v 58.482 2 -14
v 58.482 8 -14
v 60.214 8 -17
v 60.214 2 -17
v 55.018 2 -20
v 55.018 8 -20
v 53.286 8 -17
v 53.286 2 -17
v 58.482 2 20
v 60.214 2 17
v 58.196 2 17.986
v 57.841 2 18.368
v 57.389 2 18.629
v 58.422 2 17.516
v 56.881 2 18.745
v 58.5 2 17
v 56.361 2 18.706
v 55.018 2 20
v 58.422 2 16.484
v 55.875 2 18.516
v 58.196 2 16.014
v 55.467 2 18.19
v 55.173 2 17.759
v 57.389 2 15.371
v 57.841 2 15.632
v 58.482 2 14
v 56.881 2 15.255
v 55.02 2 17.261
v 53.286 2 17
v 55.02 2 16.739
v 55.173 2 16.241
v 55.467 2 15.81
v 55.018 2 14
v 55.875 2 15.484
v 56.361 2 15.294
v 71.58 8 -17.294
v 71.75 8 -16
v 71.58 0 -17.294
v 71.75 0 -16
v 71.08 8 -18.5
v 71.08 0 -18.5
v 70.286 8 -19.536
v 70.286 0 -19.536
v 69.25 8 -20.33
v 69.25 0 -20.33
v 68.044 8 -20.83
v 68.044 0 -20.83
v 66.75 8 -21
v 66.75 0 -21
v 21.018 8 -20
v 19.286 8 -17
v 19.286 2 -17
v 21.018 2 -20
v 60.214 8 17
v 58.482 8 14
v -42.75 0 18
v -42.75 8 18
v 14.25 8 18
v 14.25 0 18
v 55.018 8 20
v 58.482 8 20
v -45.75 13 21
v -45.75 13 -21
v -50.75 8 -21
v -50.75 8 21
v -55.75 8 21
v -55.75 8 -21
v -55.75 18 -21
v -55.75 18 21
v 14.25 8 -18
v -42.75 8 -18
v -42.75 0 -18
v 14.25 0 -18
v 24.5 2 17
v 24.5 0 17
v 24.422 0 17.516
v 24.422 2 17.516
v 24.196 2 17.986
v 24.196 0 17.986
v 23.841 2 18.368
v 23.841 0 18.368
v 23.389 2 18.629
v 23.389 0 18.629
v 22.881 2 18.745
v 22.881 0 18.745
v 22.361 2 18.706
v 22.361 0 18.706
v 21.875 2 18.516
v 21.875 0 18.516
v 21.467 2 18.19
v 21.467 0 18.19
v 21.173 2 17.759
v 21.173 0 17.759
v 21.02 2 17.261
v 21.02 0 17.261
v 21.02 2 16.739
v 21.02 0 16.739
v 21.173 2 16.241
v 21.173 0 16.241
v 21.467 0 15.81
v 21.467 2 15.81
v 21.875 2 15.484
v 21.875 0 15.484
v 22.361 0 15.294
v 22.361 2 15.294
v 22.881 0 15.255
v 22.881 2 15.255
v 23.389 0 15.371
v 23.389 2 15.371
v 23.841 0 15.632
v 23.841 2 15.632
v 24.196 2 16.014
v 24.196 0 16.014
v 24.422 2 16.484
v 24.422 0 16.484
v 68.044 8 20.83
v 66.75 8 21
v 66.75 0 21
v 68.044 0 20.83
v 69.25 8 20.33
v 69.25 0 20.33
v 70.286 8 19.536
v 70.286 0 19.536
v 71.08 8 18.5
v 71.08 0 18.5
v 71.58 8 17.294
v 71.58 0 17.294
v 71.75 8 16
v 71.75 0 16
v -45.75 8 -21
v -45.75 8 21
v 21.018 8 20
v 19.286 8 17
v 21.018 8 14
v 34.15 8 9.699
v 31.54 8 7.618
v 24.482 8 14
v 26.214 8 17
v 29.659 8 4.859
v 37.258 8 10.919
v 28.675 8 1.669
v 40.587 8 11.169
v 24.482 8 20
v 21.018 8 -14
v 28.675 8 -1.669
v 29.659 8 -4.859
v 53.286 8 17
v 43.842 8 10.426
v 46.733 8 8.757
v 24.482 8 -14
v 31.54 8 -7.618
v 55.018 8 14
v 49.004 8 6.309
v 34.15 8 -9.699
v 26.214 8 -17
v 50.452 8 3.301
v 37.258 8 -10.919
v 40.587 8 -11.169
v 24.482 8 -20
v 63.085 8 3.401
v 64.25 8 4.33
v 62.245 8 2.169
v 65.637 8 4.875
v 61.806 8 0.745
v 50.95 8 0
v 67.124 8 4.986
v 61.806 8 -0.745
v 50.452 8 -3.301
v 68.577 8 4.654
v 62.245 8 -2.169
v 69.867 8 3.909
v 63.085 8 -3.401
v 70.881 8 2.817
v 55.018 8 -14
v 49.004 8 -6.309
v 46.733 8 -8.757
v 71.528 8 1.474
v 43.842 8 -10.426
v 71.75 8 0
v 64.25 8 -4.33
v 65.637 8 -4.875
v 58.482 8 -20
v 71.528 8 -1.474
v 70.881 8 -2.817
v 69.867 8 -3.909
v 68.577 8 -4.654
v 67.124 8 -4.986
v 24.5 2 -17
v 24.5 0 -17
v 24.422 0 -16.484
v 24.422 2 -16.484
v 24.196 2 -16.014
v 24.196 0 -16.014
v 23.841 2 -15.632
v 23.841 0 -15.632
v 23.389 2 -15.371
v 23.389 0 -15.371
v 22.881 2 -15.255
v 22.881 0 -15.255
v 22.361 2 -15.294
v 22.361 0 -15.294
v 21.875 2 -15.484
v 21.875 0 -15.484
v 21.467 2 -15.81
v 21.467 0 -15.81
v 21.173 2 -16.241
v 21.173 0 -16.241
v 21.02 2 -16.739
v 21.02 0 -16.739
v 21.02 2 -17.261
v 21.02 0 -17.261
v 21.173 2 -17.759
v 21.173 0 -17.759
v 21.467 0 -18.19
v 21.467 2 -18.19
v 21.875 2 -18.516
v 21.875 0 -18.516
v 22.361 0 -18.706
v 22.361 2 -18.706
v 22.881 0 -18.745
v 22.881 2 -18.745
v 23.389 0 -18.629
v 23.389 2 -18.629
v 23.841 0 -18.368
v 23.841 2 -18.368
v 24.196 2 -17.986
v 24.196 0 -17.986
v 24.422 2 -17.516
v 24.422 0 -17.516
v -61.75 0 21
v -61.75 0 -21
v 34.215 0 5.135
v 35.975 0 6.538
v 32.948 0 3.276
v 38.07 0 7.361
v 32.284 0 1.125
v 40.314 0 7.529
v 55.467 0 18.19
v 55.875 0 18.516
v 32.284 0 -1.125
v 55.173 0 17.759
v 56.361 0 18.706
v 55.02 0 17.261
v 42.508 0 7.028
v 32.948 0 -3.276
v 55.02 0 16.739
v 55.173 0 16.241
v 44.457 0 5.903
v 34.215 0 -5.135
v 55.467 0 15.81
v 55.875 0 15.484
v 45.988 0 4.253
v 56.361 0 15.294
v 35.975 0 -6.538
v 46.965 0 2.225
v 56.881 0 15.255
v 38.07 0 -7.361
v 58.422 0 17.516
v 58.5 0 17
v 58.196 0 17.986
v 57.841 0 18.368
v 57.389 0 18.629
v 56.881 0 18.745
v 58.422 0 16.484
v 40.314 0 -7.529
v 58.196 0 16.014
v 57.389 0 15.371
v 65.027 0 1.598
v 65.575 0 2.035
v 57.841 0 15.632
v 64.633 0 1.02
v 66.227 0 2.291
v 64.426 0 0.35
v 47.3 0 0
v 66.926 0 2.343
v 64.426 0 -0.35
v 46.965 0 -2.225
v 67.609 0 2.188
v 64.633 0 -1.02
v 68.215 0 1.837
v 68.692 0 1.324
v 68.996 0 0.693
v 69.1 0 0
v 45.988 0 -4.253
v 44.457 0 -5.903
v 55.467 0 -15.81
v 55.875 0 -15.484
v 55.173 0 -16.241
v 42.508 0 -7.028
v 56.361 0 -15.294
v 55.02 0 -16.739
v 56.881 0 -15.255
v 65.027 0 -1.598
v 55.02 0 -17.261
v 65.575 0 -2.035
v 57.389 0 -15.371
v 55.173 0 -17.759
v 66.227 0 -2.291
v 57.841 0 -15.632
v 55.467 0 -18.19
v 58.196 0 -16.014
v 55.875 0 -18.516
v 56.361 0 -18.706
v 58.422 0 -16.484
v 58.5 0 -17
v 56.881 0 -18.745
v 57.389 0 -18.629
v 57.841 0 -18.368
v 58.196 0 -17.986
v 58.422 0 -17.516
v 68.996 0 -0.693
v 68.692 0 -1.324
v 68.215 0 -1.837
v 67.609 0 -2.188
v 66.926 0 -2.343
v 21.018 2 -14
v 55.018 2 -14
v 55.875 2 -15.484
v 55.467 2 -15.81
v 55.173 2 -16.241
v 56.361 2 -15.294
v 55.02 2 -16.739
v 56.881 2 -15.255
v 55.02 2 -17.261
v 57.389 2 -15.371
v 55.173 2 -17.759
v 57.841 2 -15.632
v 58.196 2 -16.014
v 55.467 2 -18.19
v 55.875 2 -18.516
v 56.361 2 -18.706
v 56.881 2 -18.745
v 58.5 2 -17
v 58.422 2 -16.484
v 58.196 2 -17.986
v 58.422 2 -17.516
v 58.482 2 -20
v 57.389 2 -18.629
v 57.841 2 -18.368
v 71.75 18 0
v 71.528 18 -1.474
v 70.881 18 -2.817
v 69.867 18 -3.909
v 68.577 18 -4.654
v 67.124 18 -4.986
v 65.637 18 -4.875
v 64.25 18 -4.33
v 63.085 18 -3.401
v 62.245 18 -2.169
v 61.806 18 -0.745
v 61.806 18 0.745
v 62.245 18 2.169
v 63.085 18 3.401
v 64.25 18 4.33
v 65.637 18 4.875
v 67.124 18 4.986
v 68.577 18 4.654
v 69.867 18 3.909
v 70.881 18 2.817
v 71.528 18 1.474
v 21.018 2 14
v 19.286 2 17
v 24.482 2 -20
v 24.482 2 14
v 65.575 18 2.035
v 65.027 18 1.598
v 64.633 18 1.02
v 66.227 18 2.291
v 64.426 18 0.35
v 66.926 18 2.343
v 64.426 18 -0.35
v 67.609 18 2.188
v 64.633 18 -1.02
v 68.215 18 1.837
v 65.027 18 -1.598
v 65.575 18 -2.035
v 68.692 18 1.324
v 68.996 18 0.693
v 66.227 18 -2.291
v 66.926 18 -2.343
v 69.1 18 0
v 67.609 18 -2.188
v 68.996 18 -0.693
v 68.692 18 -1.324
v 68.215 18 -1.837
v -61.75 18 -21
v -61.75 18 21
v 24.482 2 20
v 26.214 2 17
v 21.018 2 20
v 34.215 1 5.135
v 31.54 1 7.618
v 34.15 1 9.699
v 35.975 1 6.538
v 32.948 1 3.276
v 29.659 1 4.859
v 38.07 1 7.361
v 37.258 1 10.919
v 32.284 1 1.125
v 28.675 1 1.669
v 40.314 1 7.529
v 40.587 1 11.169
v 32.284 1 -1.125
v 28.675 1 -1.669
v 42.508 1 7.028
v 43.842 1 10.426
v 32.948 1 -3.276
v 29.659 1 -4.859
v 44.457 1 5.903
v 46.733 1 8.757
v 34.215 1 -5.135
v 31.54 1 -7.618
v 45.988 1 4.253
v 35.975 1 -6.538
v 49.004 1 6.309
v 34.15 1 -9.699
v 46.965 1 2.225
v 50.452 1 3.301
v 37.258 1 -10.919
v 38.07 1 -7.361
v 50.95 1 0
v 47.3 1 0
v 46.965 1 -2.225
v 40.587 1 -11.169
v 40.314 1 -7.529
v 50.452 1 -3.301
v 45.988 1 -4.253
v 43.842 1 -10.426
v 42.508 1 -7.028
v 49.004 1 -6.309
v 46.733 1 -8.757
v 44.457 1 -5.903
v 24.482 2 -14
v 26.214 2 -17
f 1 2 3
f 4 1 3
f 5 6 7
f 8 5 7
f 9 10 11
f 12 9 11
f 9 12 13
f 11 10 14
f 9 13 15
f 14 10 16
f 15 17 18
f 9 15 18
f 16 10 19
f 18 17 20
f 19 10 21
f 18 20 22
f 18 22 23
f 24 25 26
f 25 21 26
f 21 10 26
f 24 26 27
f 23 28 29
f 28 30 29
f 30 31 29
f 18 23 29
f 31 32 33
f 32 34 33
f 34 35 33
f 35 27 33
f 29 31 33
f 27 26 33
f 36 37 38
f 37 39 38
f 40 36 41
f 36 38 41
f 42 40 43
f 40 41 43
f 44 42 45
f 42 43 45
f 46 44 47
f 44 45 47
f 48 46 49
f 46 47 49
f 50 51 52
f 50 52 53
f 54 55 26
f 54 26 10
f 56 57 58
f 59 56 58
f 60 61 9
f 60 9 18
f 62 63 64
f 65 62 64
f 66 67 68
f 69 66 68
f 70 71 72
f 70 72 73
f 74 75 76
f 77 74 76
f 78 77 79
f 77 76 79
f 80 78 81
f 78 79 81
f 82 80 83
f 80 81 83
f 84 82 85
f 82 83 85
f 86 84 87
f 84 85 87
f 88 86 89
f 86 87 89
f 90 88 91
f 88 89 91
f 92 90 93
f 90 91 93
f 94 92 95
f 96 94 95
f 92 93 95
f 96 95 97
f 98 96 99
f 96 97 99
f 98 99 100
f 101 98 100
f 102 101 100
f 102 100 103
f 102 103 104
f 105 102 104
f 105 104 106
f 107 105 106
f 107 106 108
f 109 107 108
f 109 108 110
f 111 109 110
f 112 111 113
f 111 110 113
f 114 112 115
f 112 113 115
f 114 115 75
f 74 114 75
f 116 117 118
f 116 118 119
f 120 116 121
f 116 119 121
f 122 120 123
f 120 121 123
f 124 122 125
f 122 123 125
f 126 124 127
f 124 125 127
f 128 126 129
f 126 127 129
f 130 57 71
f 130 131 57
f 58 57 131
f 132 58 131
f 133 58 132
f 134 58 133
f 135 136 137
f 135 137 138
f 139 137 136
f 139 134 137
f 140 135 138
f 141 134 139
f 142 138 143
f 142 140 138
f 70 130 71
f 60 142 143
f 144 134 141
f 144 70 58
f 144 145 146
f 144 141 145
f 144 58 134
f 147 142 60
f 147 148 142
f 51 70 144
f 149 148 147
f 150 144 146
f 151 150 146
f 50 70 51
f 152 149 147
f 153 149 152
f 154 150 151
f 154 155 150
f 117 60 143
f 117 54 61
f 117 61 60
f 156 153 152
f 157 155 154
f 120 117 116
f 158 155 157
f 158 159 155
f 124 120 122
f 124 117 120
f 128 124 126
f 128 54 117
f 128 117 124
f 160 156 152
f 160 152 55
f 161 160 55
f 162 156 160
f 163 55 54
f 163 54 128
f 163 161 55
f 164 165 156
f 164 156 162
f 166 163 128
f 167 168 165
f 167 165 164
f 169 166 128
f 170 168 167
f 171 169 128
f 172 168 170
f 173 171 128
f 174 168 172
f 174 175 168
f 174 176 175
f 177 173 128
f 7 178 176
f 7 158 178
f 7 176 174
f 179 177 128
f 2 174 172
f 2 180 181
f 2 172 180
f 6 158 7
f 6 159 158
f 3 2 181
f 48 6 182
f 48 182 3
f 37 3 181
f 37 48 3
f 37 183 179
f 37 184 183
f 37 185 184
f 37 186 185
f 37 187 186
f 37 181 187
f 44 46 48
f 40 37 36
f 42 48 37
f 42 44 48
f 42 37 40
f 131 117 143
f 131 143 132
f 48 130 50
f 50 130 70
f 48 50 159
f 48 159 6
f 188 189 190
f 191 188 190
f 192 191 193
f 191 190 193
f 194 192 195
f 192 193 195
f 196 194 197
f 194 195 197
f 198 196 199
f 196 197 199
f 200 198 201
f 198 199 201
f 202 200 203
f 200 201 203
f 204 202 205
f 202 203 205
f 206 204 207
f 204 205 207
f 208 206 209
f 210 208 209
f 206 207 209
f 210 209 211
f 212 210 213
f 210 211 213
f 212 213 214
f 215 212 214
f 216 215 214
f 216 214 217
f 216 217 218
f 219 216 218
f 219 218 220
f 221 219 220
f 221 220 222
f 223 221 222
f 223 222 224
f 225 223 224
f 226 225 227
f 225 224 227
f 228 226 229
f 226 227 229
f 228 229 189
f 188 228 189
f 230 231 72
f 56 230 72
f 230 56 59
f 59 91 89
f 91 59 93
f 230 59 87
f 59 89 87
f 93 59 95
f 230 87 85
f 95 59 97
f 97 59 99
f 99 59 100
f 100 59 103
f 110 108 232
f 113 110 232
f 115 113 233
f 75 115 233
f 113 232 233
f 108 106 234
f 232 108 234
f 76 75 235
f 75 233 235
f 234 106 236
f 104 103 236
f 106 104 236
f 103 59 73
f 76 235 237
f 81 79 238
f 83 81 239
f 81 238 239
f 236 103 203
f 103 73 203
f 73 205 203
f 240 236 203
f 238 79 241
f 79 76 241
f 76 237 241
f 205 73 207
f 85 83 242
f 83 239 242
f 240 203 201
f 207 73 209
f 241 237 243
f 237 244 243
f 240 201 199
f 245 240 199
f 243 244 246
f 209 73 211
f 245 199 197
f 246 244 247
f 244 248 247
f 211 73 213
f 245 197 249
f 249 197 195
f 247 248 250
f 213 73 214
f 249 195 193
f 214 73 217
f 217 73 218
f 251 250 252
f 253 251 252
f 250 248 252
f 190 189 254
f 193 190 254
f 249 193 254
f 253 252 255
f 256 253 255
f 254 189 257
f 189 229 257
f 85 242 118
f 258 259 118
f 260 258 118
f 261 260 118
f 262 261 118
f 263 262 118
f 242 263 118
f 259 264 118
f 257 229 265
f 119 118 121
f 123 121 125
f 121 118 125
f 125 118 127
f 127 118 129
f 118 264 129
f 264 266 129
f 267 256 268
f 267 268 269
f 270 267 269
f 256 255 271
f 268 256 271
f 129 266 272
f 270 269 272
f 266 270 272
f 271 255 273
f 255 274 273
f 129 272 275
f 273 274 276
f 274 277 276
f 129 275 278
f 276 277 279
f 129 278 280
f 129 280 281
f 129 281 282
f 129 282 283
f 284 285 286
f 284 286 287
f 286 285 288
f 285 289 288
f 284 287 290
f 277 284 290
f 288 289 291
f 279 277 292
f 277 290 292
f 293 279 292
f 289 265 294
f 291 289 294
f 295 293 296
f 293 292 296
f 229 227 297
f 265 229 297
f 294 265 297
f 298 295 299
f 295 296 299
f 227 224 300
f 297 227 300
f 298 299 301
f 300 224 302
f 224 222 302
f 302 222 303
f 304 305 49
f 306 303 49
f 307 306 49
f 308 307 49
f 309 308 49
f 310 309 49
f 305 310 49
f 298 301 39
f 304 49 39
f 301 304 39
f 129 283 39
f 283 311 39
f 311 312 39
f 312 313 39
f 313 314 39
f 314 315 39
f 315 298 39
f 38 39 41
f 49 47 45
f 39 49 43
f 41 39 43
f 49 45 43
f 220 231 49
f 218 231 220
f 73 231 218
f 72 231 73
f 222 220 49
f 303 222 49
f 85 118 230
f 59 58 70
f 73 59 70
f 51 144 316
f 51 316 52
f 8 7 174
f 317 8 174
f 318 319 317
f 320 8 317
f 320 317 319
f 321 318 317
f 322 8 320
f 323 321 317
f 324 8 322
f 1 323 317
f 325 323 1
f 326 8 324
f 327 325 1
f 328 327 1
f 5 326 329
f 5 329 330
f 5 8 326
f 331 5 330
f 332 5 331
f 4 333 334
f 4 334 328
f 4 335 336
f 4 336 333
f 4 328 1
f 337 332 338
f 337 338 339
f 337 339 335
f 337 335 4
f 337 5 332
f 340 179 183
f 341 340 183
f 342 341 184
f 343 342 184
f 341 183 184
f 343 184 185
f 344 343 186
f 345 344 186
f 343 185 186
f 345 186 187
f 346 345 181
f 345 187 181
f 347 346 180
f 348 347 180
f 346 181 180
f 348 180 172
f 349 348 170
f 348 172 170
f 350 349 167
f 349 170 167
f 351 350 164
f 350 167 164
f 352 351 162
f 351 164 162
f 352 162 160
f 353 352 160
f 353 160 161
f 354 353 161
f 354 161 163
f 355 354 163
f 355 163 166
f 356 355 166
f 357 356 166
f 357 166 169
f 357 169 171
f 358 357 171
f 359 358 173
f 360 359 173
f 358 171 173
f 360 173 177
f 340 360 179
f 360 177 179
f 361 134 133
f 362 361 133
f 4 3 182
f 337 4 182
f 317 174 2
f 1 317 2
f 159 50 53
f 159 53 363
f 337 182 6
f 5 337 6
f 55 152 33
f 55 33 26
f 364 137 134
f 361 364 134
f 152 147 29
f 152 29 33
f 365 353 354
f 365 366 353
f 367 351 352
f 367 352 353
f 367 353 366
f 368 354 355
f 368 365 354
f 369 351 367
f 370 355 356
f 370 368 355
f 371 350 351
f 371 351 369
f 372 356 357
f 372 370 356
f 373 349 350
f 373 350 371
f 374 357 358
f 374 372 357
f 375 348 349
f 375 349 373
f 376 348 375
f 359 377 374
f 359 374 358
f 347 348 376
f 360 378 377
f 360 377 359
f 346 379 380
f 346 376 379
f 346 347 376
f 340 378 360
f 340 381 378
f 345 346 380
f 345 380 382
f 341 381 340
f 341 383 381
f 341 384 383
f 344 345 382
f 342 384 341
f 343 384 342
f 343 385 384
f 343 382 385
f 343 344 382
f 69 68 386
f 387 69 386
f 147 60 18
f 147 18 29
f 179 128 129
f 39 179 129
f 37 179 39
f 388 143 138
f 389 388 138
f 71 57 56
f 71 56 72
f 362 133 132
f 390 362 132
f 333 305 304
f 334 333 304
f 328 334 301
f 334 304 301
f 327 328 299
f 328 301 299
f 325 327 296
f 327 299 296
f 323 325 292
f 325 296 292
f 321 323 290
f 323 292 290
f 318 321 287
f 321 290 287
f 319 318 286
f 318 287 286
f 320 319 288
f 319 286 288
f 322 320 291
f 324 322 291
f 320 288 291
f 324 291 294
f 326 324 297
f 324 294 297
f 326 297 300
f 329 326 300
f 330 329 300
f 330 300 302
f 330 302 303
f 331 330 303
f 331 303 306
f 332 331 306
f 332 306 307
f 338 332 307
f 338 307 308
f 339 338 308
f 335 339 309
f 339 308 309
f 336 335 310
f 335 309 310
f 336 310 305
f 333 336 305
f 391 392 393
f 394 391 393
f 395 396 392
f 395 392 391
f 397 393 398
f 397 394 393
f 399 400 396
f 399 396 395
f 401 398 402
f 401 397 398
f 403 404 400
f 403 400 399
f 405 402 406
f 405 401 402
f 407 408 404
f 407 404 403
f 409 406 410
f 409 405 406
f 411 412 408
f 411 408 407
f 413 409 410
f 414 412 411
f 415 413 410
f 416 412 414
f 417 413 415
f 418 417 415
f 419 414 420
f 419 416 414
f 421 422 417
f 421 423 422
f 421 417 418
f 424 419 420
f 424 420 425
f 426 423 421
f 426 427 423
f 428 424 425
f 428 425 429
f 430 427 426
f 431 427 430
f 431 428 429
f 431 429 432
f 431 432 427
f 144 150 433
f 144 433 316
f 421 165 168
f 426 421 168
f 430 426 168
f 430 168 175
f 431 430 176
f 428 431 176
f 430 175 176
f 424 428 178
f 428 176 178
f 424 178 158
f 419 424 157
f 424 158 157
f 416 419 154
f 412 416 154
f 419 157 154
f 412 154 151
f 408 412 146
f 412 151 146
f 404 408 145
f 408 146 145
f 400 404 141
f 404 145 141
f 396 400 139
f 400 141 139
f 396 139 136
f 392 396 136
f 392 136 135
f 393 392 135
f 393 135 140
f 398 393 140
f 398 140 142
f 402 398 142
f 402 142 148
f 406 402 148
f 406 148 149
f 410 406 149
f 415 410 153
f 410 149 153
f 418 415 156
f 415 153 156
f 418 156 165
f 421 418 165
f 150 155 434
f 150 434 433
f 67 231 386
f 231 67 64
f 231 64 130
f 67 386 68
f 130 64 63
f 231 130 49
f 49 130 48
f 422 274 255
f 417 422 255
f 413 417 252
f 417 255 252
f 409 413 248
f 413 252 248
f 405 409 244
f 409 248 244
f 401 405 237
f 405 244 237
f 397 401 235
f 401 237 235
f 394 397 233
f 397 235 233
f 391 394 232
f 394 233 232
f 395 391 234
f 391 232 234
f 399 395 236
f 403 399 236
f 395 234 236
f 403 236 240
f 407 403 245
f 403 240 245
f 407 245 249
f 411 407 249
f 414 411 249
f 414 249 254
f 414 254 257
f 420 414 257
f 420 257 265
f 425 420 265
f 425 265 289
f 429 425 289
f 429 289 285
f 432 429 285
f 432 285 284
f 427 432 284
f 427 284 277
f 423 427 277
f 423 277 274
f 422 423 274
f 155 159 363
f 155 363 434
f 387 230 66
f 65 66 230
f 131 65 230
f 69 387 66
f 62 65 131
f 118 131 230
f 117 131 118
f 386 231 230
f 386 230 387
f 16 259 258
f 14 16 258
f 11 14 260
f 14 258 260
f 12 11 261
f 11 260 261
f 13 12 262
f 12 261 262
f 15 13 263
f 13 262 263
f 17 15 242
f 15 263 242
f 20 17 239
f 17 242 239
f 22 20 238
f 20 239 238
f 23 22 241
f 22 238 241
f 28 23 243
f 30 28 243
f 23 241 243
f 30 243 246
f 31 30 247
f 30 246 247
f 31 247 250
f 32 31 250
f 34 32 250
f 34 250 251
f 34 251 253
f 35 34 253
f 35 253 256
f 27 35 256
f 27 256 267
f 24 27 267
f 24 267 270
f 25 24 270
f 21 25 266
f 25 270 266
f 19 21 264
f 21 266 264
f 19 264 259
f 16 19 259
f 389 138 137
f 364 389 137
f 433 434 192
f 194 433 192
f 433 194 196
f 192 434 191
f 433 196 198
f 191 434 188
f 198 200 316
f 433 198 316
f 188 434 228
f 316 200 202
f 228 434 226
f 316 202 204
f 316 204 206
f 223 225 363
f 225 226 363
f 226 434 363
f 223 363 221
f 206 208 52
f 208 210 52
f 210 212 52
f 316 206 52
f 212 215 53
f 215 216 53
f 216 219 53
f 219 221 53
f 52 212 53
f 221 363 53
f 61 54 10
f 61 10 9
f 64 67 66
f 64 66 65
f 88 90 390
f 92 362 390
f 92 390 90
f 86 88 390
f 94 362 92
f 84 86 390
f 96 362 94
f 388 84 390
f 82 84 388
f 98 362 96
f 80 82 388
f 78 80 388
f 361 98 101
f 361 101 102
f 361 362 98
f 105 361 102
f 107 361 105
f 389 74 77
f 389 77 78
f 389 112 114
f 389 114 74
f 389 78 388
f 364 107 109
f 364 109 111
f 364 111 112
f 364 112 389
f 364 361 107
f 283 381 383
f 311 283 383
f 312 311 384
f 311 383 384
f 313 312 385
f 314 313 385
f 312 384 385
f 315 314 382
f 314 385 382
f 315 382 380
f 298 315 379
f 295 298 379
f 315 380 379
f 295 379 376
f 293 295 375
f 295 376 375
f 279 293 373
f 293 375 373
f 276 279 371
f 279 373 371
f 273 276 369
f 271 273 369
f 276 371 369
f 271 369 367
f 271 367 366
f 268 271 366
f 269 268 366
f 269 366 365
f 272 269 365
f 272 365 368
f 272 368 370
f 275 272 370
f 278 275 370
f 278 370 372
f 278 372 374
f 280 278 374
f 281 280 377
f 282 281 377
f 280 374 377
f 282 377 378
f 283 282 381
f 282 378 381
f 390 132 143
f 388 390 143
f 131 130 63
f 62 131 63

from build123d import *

# Parameters (mm, degrees)
SKETCH1_W           = 123.5
SKETCH1_H           = 42
BOSS_EXTRUDE1_DEPTH = 8
SKETCH2_R           = 11.2
CUT_EXTRUDE1_DEPTH  = 7
CUT_EXTRUDE2_REACH  = 10
SKETCH3_R           = 7.55
CUT_EXTRUDE4_DEPTH  = 6
SKETCH10_R          = 1.75
CUT_EXTRUDE5_DEPTH  = 2
SKETCH12_W          = 6
SKETCH12_H          = 10
BOSS_EXTRUDE2_DEPTH = 42
SKETCH13_W          = 57
SKETCH13_H          = 36
CUT_EXTRUDE6_DEPTH  = 9
SKETCH23_W          = 10
SKETCH23_H          = 42
BOSS_EXTRUDE3_DEPTH = 8
SKETCH24_R          = 5
BOSS_EXTRUDE4_DEPTH = 10
FILLET1_R           = 5
SKETCH25_R          = 2.35
CUT_EXTRUDE7_DEPTH  = 18


with BuildPart() as part:
    # Sketch1 → Boss-Extrude1 (new body)
    with BuildSketch(Plane(origin=(0, 0, 0), x_dir=(1, 0, 0), z_dir=(0, 1, 0))):
        Rectangle(SKETCH1_W, SKETCH1_H)
    extrude(amount=BOSS_EXTRUDE1_DEPTH)

    # Sketch2 → Cut-Extrude1 (cut)
    with BuildSketch(Plane(origin=(0, 8, 0), x_dir=(1, 0, 0), z_dir=(0, 1, 0))):
        with Locations((39.75, 0)):
            Circle(SKETCH2_R)
    extrude(amount=-CUT_EXTRUDE1_DEPTH, mode=Mode.SUBTRACT)

    # Sketch3 → Cut-Extrude2 (cut, up to next)
    with BuildSketch(Plane.XZ, mode=Mode.PRIVATE) as cut_extrude2_sk1:
        with Locations((39.75, 0)):
            Circle(SKETCH3_R)
    cut_extrude2_tool1 = extrude(cut_extrude2_sk1.sketch, amount=-CUT_EXTRUDE2_REACH, mode=Mode.PRIVATE) & part.part
    add(cut_extrude2_tool1.solids().sort_by_distance((39.75, 0, 0))[0], mode=Mode.SUBTRACT)

    # Sketch9 → Cut-Extrude4 (cut)
    with BuildSketch(Plane(origin=(0, 8, 0), x_dir=(1, 0, 0), z_dir=(0, 1, 0))):
        Polygon((58.482050808, 20), (55.017949192, 20), (53.285898385, 17), (55.017949192, 14), (58.482050808, 14), (60.214101615, 17), align=None)
        Polygon((60.214101615, -17), (58.482050808, -20), (55.017949192, -20), (53.285898385, -17), (55.017949192, -14), (58.482050808, -14), align=None)
        Polygon((19.285898385, 17), (21.017949192, 20), (24.482050808, 20), (26.214101615, 17), (24.482050808, 14), (21.017949192, 14), align=None)
        Polygon((21.017949192, -14), (19.285898385, -17), (21.017949192, -20), (24.482050808, -20), (26.214101615, -17), (24.482050808, -14), align=None)
    extrude(amount=-CUT_EXTRUDE4_DEPTH, mode=Mode.SUBTRACT)

    # Sketch10 → Cut-Extrude5 (cut)
    with BuildSketch(Plane.XZ):
        with Locations((56.75, 17)):
            Circle(SKETCH10_R)
        with Locations((22.75, 17)):
            Circle(SKETCH10_R)
        with Locations((56.75, -17)):
            Circle(SKETCH10_R)
        with Locations((22.75, -17)):
            Circle(SKETCH10_R)
    extrude(amount=-CUT_EXTRUDE5_DEPTH, mode=Mode.SUBTRACT)

    # Sketch12 → Boss-Extrude2 (add)
    with BuildSketch(Plane(origin=(0, 0, -21), x_dir=(-1, 0, 0), z_dir=(0, 0, -1))):
        with Locations((58.75, 13)):
            Rectangle(SKETCH12_W, SKETCH12_H)
        Polygon((50.75, 8), (45.75, 8), (45.75, 13), align=None)
    extrude(amount=-BOSS_EXTRUDE2_DEPTH)

    # Sketch13 → Cut-Extrude6 (cut, through all)
    with BuildSketch(Plane(origin=(0, 8, 0), x_dir=(1, 0, 0), z_dir=(0, 1, 0))):
        with Locations((-14.25, 0)):
            Rectangle(SKETCH13_W, SKETCH13_H)
    extrude(amount=-CUT_EXTRUDE6_DEPTH, mode=Mode.SUBTRACT)

    # Sketch23 → Boss-Extrude3 (add)
    with BuildSketch(Plane(origin=(0, 8, 0), x_dir=(1, 0, 0), z_dir=(0, 1, 0))):
        with Locations((66.75, 0)):
            Rectangle(SKETCH23_W, SKETCH23_H)
    extrude(amount=-BOSS_EXTRUDE3_DEPTH)

    # Sketch24 → Boss-Extrude4 (add)
    with BuildSketch(Plane(origin=(0, 8, 0), x_dir=(1, 0, 0), z_dir=(0, 1, 0))):
        with Locations((66.75, 0)):
            Circle(SKETCH24_R)
    extrude(amount=BOSS_EXTRUDE4_DEPTH)

    # Fillet1
    fillet1_edges = [part.edges().sort_by_distance(p)[0] for p in [
        (71.75, 4, -21),
        (71.75, 4, 21),
    ]]
    fillet(fillet1_edges, radius=FILLET1_R)

    # Sketch25 → Cut-Extrude7 (cut)
    with BuildSketch(Plane(origin=(0, 18, 0), x_dir=(1, 0, 0), z_dir=(0, 1, 0))):
        with Locations((66.75, 0)):
            Circle(SKETCH25_R)
    extrude(amount=-CUT_EXTRUDE7_DEPTH, mode=Mode.SUBTRACT)


solid = part.part
